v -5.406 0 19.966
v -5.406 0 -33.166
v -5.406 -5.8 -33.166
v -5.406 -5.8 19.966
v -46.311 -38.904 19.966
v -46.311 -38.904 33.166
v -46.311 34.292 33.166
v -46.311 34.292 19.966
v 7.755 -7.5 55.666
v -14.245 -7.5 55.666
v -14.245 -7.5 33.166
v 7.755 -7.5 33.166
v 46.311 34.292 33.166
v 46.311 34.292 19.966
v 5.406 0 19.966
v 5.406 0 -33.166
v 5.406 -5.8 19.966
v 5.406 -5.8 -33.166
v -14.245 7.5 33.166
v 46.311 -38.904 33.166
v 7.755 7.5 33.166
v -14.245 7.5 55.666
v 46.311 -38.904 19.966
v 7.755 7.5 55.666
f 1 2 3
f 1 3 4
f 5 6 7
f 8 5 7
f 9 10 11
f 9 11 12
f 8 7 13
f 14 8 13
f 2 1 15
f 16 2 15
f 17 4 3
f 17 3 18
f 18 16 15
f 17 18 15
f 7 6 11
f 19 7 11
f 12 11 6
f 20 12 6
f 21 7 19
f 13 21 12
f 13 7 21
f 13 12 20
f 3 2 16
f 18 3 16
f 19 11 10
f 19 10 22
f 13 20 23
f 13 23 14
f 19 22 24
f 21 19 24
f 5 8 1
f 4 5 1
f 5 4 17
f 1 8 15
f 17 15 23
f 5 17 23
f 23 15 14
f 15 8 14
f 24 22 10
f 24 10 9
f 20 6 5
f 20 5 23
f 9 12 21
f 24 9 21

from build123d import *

# Parameters (mm, degrees)
F0_W     = 10.811692
F0_H     = 66.33117
F1_DEPTH = 5.8
F2_W     = 92.621132
F2_H     = 73.195636
F2_W_2   = 10.811692
F2_H_2   = 5.8
F3_DEPTH = 13.2
F4_W     = 22
F4_H     = 15
F5_DEPTH = 22.5


with BuildPart() as f1:
    # F0 (on Front) → F1 (new body)
    with BuildSketch(Plane.XZ):
        Rectangle(F0_W, F0_H)
    extrude(amount=F1_DEPTH)

    # F2 (on face) → F3 (join)
    with BuildSketch(Plane.XY.offset(33.165585)):
        with Locations((0, -2.3061)):
            Rectangle(F2_W, F2_H)
        with Locations((0, -2.9)):
            Rectangle(F2_W_2, F2_H_2, mode=Mode.SUBTRACT)
    extrude(amount=-F3_DEPTH)

    # F4 (on face) → F5 (join)
    with BuildSketch(Plane.XY.offset(33.165585)):
        with Locations((-3.245262, 0)):
            Rectangle(F4_W, F4_H)
    extrude(amount=F5_DEPTH)


solid = f1.part
